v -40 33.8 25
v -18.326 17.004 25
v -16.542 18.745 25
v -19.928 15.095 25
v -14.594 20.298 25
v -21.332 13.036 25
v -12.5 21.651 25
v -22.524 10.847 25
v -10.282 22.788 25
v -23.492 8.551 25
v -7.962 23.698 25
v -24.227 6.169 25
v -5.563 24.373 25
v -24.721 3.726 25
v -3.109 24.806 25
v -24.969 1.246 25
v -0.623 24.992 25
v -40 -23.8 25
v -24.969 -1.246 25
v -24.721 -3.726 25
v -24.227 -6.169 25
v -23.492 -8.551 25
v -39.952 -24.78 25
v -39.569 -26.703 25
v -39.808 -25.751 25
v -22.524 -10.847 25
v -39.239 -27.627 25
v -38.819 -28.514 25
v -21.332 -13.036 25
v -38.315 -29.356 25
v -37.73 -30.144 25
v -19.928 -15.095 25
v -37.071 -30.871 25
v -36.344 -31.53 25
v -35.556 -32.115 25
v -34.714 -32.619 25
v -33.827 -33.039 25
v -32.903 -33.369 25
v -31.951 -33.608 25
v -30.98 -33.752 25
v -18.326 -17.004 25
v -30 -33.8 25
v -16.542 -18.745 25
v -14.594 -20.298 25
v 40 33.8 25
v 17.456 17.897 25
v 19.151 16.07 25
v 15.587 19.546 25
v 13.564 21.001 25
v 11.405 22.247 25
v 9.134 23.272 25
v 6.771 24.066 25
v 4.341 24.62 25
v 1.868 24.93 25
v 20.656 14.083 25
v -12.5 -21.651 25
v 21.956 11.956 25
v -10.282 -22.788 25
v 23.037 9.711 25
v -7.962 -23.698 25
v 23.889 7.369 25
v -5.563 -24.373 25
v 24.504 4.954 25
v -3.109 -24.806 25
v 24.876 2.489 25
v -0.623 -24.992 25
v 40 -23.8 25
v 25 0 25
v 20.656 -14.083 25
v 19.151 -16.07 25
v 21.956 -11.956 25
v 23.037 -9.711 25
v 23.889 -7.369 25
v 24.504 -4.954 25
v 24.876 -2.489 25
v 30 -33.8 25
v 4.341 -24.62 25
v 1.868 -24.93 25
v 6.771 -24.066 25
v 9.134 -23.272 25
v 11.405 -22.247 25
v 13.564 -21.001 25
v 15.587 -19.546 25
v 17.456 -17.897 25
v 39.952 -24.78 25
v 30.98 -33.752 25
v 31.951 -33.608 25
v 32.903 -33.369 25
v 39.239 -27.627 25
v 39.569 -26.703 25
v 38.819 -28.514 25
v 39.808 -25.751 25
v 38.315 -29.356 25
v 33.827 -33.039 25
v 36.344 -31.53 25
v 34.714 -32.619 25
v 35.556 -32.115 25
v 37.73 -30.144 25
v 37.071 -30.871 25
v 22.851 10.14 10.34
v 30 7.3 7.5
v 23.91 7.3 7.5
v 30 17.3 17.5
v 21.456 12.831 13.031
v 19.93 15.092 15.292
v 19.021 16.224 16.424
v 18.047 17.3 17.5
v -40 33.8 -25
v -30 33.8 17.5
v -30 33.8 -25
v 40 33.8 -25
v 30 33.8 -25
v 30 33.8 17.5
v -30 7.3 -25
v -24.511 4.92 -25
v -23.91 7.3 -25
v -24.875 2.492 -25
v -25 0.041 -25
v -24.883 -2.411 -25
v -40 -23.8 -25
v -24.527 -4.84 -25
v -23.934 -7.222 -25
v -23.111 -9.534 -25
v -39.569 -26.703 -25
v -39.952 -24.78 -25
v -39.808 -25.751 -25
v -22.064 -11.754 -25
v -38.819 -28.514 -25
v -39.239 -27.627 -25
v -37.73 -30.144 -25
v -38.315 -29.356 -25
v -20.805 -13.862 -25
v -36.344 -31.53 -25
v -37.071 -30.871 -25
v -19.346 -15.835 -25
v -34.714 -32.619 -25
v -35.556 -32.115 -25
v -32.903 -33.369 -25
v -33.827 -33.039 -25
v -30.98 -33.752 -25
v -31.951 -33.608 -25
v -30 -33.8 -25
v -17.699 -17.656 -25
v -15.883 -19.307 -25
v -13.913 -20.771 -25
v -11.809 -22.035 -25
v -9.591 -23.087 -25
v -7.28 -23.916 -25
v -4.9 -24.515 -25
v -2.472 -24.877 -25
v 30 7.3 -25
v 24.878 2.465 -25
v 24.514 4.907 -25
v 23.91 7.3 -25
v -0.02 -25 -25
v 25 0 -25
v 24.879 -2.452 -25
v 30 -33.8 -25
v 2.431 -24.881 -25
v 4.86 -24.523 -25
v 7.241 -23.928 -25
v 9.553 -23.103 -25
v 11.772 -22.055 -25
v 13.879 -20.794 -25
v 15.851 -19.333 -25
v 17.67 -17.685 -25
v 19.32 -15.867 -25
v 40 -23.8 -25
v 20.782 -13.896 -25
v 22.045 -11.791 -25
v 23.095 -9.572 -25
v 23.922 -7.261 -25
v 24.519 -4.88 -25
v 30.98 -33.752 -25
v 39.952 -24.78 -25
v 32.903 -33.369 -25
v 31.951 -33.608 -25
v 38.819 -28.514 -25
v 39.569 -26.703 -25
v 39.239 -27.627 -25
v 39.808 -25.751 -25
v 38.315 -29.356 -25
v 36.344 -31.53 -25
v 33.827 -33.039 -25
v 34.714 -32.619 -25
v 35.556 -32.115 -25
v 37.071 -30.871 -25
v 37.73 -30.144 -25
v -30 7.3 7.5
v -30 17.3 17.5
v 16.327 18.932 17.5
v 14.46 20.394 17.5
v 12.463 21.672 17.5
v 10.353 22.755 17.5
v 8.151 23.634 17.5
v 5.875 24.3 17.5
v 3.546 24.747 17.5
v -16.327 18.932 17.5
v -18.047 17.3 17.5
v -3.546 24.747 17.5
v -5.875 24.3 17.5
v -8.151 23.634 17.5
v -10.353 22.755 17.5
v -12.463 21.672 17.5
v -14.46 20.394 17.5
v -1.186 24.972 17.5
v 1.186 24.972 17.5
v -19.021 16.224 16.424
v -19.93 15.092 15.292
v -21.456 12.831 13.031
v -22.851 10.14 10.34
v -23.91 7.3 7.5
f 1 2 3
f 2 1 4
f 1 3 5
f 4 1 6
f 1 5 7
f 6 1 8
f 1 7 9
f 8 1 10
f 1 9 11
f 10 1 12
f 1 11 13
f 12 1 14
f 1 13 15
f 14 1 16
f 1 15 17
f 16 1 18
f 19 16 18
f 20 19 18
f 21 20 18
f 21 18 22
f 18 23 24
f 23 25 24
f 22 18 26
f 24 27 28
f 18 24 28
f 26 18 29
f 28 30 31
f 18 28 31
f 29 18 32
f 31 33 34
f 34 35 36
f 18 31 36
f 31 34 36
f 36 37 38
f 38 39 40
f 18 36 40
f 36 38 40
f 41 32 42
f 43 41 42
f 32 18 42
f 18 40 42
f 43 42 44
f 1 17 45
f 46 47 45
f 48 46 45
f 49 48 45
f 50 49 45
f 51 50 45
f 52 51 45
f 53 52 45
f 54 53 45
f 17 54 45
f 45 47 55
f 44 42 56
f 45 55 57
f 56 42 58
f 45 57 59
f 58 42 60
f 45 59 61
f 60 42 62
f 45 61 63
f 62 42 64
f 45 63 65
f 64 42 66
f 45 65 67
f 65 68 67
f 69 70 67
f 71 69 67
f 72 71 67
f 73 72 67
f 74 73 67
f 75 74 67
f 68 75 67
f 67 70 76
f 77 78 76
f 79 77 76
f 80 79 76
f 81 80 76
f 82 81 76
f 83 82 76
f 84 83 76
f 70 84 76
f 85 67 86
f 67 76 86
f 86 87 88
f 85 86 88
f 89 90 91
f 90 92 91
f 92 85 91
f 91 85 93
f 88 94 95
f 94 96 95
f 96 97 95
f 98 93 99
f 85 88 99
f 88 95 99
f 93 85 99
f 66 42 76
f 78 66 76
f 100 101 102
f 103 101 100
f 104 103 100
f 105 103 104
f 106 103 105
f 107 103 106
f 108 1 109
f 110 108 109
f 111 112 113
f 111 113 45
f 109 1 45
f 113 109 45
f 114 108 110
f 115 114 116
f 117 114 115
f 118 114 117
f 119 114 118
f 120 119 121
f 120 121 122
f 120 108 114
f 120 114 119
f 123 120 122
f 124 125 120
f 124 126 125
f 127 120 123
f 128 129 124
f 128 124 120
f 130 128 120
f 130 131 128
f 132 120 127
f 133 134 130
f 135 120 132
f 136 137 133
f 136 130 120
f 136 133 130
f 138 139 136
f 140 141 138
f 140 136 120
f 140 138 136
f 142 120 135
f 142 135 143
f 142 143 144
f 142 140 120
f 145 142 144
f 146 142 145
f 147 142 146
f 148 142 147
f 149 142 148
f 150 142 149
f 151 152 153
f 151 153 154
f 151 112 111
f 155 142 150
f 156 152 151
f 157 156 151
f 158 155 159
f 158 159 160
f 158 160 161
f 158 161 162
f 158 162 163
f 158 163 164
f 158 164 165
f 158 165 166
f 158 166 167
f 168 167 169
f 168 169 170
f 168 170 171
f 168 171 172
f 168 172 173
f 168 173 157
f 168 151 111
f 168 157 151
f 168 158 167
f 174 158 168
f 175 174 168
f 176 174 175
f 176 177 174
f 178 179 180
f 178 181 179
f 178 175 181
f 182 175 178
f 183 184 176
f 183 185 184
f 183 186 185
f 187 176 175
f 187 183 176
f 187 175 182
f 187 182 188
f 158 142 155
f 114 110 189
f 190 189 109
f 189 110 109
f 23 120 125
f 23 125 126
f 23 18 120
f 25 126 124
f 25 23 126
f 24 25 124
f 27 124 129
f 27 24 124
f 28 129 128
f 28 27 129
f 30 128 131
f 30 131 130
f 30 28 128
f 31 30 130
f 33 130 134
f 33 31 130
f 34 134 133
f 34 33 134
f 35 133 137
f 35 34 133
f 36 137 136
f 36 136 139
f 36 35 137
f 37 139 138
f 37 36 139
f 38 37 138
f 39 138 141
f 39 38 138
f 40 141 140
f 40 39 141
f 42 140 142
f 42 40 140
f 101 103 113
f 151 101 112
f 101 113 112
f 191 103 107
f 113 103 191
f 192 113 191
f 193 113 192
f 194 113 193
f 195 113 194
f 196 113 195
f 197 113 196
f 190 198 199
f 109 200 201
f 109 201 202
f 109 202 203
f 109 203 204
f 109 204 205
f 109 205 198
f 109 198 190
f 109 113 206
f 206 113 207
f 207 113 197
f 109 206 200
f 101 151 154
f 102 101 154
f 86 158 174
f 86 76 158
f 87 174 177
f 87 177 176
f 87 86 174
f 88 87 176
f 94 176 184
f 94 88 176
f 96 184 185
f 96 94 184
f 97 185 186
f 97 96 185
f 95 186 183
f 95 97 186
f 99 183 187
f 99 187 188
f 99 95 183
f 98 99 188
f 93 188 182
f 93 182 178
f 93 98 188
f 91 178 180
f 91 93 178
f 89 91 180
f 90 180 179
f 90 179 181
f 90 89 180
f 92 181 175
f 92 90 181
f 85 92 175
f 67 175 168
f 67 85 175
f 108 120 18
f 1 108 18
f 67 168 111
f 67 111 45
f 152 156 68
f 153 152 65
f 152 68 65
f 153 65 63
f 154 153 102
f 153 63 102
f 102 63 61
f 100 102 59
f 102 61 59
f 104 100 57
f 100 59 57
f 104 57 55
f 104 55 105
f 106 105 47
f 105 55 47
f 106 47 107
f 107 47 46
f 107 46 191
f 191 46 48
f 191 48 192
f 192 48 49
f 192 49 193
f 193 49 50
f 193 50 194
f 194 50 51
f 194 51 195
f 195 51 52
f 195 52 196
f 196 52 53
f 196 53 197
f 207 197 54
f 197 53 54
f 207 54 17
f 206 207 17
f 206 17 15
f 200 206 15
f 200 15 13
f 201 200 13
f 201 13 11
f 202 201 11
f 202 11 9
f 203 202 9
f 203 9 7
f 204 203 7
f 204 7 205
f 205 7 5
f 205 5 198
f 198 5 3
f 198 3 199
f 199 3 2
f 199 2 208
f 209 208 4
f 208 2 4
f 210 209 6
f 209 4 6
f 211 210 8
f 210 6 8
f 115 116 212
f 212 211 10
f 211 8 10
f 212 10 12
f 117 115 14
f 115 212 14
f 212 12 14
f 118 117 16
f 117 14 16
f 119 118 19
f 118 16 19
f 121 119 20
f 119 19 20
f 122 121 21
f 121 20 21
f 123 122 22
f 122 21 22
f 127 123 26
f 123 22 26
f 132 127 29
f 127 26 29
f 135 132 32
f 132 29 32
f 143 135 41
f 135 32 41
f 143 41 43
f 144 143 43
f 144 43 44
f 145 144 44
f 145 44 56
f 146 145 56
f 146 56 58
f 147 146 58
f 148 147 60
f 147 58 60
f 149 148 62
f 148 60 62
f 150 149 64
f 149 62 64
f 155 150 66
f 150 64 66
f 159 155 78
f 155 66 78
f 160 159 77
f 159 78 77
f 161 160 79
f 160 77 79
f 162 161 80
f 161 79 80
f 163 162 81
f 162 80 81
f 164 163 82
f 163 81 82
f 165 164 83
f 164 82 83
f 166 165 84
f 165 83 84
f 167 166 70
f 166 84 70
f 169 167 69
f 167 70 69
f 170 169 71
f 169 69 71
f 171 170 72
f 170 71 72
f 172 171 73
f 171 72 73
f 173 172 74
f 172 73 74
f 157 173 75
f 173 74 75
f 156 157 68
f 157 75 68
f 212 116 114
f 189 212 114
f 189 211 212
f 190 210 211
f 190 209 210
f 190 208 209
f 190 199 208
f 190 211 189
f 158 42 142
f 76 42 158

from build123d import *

# Parameters (mm, degrees)
F0_W     = 80
F0_H     = 50
F1_DEPTH = 33.8
F2_R     = 25
F3_DEPTH = 104.1
F4_R     = 10
F5_W     = 60
F5_H     = 42.5
F5_H_2   = 7.5
F6_DEPTH = 26.5
F7_SIZE  = 10


with BuildPart() as f1:
    # F0 (on Front) → F1 (new body, symmetric)
    with BuildSketch(Plane.XZ):
        Rectangle(F0_W, F0_H)
    extrude(amount=F1_DEPTH, both=True)

    # F2 (on face) → F3 (cut)
    with BuildSketch(Plane.XY.offset(25)):
        Circle(F2_R)
    extrude(amount=-F3_DEPTH, mode=Mode.SUBTRACT)

    # F4
    f4_edges = [f1.edges().sort_by_distance(p)[0] for p in [
        (40, -33.8, 0),
        (-40, -33.8, 0),
    ]]
    fillet(f4_edges, radius=F4_R)

    # F5 (on face) → F6 (cut)
    with BuildSketch(Plane(origin=(0, 33.8, 0), x_dir=(-1, 0, 0), z_dir=(0, 1, 0))):
        with Locations((0, -3.75)):
            Rectangle(F5_W, F5_H)
        with Locations((0, -28.75)):
            Rectangle(F5_W, F5_H_2)
    extrude(amount=-F6_DEPTH, mode=Mode.SUBTRACT)

    # F7
    f7_edges = [f1.edges().sort_by_distance(p)[0] for p in [
        (26.955229, 7.3, 17.5),
        (-26.955229, 7.3, 17.5),
    ]]
    chamfer(f7_edges, length=F7_SIZE)


solid = f1.part
